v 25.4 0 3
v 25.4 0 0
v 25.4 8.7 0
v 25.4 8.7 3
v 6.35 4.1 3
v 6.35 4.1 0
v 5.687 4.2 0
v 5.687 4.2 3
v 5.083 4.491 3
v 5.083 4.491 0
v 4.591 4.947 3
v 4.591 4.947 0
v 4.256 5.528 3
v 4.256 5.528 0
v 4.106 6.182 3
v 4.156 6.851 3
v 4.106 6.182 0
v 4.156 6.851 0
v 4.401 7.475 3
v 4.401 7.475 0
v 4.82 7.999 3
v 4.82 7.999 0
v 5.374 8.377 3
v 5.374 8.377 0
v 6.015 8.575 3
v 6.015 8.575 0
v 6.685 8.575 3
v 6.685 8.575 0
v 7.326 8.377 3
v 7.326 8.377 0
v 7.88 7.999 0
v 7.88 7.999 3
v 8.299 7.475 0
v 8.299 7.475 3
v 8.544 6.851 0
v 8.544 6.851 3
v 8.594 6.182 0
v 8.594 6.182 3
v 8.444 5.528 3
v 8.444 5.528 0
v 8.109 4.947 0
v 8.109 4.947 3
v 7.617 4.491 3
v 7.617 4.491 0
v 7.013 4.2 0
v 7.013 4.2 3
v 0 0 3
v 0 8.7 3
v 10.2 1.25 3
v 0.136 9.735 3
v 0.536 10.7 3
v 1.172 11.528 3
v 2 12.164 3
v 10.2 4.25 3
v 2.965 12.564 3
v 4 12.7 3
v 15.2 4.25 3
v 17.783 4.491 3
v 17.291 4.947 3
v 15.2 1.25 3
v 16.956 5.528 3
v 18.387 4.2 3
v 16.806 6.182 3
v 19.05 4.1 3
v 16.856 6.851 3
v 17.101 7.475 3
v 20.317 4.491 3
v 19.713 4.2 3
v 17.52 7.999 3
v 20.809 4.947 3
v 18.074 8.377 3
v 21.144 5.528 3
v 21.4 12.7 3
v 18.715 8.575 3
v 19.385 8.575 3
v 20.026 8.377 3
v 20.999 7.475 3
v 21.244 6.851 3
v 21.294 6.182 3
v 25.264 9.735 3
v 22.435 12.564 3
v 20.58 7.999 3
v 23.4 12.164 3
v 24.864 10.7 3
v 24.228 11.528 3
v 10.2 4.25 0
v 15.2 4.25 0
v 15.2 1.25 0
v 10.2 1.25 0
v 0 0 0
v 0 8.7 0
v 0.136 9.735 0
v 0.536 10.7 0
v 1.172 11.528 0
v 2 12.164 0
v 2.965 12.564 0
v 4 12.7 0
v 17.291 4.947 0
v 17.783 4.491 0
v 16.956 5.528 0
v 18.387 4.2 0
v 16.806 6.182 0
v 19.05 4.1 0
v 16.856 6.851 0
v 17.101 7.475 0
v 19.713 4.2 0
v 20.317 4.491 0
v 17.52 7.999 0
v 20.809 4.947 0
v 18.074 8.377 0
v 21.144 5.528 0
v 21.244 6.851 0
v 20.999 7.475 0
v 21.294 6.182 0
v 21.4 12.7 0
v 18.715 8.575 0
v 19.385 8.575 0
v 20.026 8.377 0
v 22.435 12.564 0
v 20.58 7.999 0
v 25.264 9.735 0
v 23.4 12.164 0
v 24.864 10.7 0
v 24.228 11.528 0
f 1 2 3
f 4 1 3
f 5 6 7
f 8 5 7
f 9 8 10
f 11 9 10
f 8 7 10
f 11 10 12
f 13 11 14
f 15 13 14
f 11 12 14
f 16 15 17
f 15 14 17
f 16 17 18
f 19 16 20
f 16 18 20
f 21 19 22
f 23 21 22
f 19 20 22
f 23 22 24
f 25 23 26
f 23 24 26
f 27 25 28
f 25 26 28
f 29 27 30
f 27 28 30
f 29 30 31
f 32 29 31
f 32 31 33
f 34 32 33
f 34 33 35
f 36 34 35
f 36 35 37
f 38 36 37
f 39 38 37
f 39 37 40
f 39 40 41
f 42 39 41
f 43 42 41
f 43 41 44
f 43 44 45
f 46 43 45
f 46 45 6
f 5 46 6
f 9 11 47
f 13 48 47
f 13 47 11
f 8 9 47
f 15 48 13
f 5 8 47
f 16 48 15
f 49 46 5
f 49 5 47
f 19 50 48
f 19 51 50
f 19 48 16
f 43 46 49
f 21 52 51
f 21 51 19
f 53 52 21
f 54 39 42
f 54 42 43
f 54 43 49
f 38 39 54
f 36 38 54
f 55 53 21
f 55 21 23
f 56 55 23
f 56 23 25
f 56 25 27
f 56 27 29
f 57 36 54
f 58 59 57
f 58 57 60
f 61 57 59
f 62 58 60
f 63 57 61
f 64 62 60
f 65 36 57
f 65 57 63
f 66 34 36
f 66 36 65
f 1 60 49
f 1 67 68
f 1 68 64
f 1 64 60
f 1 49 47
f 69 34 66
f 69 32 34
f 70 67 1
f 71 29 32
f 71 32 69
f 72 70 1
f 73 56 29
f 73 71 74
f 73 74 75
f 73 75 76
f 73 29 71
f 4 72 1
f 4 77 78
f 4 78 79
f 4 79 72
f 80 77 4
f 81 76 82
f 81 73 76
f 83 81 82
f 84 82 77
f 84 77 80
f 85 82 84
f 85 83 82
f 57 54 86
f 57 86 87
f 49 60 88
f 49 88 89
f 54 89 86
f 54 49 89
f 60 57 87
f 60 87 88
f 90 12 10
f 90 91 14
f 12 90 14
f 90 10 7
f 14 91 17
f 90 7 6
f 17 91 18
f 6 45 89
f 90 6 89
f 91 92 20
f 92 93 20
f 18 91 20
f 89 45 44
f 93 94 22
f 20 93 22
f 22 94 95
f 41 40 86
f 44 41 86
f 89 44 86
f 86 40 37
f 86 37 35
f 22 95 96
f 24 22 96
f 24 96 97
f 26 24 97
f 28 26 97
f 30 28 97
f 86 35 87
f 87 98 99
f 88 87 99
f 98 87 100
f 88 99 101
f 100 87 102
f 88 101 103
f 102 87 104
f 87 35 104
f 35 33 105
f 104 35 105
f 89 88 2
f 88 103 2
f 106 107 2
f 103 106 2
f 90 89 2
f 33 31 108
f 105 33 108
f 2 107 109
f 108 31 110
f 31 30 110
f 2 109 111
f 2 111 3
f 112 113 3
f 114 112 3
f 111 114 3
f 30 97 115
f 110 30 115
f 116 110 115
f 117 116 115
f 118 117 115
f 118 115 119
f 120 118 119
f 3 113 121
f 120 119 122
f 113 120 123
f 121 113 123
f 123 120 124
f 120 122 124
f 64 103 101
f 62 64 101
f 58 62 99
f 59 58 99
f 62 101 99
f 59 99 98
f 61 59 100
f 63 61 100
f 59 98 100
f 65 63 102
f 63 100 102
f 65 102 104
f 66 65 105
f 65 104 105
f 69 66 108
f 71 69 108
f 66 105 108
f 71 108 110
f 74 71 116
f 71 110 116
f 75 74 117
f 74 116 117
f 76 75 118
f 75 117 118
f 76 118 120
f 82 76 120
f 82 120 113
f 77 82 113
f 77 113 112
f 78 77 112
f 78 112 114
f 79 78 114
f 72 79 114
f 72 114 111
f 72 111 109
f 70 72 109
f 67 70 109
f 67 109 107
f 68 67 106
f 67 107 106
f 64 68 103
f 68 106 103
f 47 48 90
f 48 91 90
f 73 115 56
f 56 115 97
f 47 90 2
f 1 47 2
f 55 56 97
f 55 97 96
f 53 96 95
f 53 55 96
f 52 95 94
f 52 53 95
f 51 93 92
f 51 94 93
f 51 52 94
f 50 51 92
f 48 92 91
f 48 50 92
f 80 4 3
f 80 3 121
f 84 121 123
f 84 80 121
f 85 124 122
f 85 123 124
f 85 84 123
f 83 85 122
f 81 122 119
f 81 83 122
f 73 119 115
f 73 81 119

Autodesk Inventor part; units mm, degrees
ref_plane "YZ Plane" through (0, 0, 0) normal (1, 0, 0) x (0, 1, 0)
ref_plane "XZ Plane" through (0, 0, 0) normal (0, 1, 0) x (-1, 0, 0)
ref_plane "XY Plane" through (0, 0, 0) normal (0, 0, 1) x (1, 0, 0)
sketch "Sketch1" plane through (0, 0, 0) normal (0, 0, 1) x (1, 0, 0)
  line L0 (0, 0) -> (25.4, 0)
  line L1 (25.4, 0) -> (25.4, 12.7)
  line L2 (25.4, 12.7) -> (0, 12.7)
  line L3 (0, 12.7) -> (0, 0)
  dimension "d0" = 25.4
  dimension "d1" = 12.7
extrude "Extrusion1" add sketch "Sketch1" along normal blind 3
fillet "Fillet1" radius 4 2 edges at (0, 12.7, 1.5) (25.4, 12.7, 1.5)
sketch "Sketch2" plane through (0, 0, 3) normal (0, 0, 1) x (1, 0, 0)
  line L0 (21.4, 12.7) -> (4, 12.7) projected
  line L1 (0, 8.7) -> (0, 0) projected
  line L2 (25.4, 0) -> (25.4, 8.7) projected
  line L3 (10.2, 4.25) -> (15.2, 4.25)
  line L4 (15.2, 4.25) -> (15.2, 1.25)
  line L5 (15.2, 1.25) -> (10.2, 1.25)
  line L6 (10.2, 1.25) -> (10.2, 4.25)
  line L7 (0, 0) -> (25.4, 0) projected
  point P0 (12.7, 12.7)
  point P1 (12.7, 4.25)
  point P2 (12.7, 0)
  point P3 (12.7, 1.25)
  point P4 (6.35, 6.35)
  point P5 (19.05, 6.35)
  dimension "d10" = 5
  dimension "d11" = 3
  dimension "d12" = 1.25
  dimension "d15" = 6.35
  dimension "d16" = 6.35
  dimension "d17" = 6.35
extrude "Extrusion2" cut sketch "Sketch2" against normal through all
hole "Hole1" at (19.05, 6.35, 3) at (6.35, 6.35, 3) direction (0, 0, -1) diameter 4.5 end through all clearance for "Flat Head Machine Screw" size "M4" standard "Ansi Metric M Profile"
properties part number "Moving Ramp Holder Base"
